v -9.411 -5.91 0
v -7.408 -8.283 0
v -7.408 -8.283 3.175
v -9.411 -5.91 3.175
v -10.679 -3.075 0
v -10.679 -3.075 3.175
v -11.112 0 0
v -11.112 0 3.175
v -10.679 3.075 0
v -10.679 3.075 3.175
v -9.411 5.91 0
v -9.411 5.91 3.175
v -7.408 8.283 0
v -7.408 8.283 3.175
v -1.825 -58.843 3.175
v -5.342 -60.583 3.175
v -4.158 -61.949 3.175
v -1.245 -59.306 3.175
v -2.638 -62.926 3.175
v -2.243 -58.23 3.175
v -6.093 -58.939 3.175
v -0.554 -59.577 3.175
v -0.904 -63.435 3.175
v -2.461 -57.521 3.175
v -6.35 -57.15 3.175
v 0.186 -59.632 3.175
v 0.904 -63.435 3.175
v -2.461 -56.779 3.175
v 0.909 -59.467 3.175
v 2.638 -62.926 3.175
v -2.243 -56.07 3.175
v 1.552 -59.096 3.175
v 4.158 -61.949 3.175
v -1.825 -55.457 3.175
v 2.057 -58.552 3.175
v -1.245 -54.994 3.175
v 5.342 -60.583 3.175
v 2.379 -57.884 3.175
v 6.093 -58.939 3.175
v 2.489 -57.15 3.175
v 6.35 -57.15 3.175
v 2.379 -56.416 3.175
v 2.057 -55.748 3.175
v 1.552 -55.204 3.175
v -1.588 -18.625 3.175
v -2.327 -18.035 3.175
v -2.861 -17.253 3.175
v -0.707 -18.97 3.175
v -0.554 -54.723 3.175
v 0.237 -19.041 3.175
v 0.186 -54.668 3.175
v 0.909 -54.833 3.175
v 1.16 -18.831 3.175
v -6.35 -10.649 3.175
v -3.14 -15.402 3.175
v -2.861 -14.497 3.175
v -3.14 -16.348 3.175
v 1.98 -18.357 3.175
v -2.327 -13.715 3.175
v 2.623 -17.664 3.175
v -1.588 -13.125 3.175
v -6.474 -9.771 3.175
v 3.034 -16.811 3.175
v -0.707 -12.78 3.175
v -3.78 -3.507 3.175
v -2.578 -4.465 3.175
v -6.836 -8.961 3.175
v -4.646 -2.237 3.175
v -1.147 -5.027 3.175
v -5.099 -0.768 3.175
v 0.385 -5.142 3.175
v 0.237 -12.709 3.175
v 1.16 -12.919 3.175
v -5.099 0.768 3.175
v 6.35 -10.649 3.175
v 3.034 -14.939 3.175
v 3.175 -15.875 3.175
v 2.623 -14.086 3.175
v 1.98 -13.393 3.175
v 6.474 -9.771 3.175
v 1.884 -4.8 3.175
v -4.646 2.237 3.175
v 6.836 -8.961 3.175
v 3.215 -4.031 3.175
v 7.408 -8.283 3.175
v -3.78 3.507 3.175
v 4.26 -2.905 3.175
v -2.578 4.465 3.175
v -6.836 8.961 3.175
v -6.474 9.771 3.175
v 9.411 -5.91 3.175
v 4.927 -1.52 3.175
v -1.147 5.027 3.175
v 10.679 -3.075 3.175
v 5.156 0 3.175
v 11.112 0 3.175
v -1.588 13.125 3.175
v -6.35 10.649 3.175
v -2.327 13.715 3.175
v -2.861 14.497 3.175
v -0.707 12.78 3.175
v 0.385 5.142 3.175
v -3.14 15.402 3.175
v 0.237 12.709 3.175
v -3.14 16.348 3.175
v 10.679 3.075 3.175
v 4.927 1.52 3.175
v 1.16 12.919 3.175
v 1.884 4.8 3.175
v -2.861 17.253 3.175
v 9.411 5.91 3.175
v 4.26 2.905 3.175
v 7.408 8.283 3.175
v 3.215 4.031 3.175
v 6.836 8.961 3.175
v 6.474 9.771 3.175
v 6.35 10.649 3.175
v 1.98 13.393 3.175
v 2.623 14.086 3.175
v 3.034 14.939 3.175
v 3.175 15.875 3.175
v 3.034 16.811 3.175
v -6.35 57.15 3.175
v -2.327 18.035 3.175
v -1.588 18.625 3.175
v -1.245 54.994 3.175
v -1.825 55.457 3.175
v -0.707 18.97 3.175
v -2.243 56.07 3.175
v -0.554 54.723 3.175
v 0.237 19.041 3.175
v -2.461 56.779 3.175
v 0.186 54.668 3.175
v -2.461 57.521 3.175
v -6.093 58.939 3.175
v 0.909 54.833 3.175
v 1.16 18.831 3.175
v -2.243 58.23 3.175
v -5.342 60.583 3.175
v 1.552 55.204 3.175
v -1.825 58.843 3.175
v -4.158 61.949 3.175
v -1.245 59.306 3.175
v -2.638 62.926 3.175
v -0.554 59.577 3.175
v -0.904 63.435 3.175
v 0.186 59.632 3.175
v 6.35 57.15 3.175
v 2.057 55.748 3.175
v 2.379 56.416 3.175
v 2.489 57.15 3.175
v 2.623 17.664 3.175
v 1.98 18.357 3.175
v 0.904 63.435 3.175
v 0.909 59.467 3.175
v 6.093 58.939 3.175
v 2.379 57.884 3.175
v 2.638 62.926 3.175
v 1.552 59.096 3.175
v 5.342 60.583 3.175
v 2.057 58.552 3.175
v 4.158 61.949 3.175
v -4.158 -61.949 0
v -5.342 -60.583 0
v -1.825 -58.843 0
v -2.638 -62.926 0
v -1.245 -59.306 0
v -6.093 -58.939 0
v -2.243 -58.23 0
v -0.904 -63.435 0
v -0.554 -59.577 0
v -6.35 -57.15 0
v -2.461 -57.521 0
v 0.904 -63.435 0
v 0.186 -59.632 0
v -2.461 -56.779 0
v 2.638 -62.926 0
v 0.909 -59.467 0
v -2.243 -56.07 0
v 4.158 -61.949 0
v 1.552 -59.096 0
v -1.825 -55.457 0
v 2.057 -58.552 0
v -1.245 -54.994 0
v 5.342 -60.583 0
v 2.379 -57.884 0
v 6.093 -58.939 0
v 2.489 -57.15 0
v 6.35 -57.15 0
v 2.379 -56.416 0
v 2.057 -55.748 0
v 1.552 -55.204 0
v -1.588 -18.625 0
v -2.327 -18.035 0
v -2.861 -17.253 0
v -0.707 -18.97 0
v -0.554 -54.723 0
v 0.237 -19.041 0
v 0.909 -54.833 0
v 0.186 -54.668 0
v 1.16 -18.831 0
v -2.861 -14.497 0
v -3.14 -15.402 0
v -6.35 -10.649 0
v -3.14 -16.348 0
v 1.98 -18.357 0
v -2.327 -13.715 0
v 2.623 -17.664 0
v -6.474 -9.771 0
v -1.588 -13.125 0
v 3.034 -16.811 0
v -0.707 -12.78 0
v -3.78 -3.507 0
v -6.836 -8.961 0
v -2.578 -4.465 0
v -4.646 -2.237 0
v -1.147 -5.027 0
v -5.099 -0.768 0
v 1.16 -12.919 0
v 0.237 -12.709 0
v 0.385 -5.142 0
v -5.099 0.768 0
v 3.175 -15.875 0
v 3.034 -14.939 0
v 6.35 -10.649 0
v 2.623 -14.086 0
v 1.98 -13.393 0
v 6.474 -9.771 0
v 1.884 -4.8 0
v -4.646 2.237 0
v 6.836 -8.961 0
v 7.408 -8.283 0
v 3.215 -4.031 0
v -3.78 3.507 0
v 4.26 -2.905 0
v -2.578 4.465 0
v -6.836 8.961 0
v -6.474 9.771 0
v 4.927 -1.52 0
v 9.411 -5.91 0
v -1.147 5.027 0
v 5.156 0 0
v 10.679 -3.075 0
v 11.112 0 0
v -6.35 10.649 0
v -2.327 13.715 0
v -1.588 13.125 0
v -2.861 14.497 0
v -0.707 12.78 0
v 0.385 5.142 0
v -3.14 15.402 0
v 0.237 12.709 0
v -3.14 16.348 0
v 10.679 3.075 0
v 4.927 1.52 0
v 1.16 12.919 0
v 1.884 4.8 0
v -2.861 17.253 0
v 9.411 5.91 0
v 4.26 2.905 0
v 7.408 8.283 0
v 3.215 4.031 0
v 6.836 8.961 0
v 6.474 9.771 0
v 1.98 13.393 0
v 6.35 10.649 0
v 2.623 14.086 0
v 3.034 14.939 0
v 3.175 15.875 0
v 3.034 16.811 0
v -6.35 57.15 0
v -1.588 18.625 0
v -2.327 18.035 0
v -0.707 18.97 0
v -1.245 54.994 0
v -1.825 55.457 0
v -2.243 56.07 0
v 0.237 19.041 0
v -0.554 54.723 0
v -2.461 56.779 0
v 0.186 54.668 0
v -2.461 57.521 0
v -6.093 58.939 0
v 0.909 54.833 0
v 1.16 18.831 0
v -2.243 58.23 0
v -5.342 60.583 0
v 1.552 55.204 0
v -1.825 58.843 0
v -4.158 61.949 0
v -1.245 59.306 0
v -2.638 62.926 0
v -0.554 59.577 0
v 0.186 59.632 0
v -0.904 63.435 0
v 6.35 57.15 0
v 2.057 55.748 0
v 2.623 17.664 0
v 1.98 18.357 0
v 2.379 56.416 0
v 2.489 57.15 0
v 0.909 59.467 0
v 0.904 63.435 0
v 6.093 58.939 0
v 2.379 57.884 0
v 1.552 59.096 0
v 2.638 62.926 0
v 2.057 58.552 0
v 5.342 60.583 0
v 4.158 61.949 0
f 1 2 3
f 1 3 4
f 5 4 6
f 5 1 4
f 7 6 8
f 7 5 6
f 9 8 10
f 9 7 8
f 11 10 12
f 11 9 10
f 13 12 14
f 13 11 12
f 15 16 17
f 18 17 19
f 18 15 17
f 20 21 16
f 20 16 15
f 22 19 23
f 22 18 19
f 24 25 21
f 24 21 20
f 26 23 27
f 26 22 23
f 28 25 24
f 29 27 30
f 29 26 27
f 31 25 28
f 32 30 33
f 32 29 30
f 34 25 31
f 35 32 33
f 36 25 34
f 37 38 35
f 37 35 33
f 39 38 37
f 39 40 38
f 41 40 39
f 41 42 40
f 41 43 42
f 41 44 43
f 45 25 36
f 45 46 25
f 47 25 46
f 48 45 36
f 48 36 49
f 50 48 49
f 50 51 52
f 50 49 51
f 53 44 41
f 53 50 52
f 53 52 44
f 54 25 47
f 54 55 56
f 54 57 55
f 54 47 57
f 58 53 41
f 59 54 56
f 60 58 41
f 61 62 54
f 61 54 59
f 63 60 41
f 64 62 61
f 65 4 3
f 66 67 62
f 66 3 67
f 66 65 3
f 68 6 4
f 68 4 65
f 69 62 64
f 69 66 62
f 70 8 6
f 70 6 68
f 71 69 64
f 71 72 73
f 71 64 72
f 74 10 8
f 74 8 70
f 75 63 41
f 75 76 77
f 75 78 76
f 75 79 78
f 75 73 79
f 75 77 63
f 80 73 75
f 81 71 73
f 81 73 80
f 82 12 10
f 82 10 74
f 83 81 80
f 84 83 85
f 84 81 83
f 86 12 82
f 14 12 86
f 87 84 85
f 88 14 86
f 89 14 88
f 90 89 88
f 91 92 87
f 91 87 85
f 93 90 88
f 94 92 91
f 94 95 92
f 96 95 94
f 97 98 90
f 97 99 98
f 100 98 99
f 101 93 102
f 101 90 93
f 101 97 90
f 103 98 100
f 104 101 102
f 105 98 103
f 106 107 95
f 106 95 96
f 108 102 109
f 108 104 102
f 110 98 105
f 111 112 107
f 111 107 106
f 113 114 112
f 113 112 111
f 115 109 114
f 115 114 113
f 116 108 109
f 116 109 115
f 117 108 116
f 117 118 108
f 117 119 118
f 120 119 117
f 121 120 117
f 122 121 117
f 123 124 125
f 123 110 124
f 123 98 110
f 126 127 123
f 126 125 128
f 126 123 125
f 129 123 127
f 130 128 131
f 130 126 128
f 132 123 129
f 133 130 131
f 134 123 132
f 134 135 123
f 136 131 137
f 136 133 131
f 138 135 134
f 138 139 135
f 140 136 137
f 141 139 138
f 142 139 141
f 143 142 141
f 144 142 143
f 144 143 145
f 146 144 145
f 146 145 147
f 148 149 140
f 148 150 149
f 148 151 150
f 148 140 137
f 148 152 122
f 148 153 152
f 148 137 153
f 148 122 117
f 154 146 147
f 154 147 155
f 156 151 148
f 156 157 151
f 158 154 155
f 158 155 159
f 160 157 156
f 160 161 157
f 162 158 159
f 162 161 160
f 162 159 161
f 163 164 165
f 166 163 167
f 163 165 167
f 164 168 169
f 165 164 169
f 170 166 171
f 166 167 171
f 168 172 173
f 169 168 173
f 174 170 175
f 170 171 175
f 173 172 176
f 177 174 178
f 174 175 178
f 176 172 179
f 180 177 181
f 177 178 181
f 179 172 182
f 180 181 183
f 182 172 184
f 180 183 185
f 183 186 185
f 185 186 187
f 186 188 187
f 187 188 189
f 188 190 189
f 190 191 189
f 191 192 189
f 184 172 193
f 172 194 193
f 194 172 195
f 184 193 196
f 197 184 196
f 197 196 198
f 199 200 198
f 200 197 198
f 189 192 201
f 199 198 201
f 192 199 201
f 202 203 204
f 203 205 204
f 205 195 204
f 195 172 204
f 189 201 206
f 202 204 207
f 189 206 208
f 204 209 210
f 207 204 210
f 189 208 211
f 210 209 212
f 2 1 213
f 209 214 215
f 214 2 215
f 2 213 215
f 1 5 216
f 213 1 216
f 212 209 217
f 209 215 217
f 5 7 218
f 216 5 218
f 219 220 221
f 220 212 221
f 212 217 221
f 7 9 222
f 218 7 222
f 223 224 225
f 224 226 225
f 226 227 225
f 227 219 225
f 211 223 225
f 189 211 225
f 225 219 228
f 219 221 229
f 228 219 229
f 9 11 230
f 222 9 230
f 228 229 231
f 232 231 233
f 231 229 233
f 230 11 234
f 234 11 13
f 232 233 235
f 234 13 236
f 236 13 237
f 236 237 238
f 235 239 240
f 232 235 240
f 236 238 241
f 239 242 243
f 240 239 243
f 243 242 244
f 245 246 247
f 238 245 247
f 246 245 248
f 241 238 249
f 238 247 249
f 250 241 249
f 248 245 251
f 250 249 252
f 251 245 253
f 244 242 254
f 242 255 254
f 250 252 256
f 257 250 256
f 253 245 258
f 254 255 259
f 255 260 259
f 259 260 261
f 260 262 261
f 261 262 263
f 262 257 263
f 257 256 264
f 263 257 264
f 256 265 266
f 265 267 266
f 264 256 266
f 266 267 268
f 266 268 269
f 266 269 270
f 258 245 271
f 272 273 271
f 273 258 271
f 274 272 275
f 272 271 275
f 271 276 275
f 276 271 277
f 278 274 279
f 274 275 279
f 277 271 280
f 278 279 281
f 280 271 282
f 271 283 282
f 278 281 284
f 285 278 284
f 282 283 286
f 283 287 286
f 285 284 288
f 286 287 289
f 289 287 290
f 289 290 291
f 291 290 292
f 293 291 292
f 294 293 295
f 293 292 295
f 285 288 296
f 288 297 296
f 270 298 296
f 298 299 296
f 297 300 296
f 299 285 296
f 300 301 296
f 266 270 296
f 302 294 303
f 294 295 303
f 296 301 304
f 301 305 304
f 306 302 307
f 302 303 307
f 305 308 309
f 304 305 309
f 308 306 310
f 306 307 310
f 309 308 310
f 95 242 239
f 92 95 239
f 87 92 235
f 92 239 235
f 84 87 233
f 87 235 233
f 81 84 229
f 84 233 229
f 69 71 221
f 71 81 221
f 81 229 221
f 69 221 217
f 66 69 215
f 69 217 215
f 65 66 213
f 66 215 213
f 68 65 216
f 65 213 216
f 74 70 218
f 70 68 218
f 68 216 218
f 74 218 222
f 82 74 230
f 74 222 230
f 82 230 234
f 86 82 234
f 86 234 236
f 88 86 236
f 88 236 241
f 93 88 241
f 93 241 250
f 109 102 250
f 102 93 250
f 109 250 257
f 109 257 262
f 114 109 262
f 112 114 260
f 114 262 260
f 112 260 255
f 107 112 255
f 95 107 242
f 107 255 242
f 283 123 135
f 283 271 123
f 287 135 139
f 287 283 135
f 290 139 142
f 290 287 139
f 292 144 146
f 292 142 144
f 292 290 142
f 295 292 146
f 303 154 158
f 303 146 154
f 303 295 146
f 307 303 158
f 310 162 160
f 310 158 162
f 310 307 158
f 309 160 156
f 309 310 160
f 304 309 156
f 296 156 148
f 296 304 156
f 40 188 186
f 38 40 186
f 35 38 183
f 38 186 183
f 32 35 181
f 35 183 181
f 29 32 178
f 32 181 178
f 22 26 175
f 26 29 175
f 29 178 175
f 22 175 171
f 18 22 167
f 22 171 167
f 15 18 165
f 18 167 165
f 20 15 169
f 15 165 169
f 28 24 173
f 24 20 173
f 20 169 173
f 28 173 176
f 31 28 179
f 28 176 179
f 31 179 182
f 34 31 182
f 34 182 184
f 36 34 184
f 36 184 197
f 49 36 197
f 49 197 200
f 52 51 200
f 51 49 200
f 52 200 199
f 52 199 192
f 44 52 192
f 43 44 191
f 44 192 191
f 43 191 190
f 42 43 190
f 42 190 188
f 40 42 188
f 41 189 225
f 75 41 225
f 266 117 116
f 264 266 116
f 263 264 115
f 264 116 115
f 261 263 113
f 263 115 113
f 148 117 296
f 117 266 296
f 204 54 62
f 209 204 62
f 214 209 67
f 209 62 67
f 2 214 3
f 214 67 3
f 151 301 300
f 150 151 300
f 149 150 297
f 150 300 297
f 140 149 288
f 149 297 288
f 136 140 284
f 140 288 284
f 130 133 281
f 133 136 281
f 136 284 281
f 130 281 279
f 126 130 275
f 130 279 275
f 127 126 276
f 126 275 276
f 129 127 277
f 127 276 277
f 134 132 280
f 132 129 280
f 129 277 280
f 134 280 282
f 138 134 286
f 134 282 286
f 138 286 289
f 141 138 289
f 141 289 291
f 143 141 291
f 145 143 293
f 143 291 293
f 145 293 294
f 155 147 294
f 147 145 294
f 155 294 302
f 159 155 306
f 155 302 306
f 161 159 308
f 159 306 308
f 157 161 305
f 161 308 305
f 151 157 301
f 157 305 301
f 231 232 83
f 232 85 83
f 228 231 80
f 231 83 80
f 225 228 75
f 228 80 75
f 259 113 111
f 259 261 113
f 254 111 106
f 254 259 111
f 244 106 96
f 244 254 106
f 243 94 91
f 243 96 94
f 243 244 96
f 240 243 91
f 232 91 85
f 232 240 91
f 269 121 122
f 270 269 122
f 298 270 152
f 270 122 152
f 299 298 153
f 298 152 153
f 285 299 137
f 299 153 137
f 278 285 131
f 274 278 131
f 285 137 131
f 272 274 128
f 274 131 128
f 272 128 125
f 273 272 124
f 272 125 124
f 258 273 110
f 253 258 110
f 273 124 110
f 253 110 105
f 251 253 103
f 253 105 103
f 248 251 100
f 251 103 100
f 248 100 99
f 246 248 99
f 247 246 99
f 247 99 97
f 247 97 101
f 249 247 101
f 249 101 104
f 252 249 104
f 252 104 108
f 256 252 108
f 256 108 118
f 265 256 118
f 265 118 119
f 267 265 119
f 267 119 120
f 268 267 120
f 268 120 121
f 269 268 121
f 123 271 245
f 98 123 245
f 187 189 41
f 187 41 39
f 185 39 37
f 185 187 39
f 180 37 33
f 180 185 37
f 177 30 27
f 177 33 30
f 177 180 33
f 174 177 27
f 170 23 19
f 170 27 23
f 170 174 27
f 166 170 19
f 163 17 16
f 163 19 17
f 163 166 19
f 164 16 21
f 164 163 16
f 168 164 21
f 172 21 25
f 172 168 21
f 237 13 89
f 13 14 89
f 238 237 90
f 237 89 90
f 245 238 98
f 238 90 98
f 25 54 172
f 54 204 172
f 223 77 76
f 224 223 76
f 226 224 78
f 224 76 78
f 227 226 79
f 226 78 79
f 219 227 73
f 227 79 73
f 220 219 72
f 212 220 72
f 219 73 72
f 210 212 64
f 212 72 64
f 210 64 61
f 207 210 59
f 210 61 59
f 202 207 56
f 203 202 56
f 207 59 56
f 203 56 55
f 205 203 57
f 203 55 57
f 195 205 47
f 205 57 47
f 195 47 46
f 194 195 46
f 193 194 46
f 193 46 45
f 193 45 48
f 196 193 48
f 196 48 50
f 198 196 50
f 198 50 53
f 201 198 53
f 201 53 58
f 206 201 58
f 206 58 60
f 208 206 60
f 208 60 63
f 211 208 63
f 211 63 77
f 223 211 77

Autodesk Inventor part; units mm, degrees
ref_plane "YZ Plane" through (0, 0, 0) normal (1, 0, 0) x (0, 1, 0)
ref_plane "XZ Plane" through (0, 0, 0) normal (0, 1, 0) x (-1, 0, 0)
ref_plane "XY Plane" through (0, 0, 0) normal (0, 0, 1) x (1, 0, 0)
sketch "Sketch1" plane through (0, 0, 0) normal (0, 0, 1) x (1, 0, 0)
  line L0 (0, -57.15) -> (0, 57.15) construction
  line L1 (6.35, -57.15) -> (6.35, 57.15)
  line L2 (-6.35, 57.15) -> (-6.35, -57.15)
  arc A0 (-6.35, -57.15) -> (6.35, -57.15) centre (0, -57.15) ccw
  arc A1 (6.35, 57.15) -> (-6.35, 57.15) centre (0, 57.15) ccw
  circle A2 centre (0, 57.15) radius 2.4892
  circle A3 centre (0, -57.15) radius 2.4892
  circle A4 centre (0, 0) radius 5.1562
  circle A5 centre (0, 0) radius 11.1125
  point P0 (-6.35, 9.1195)
  point P1 (-6.35, -9.1195)
  point P2 (6.35, -9.1195)
  point P3 (6.35, 9.1195)
  dimension "d0" = 114.3
  dimension "d1" = 12.7
  dimension "d2" = 4.9784
  dimension "d3" = 10.3124
  dimension "d4" = 22.225
extrude "Extrusion1" add sketch "Sketch1" along normal blind 3.175
sketch "Sketch2" plane through (0, 0, 3.175) normal (0, 0, 1) x (1, 0, 0)
  circle A0 centre (0, 0) radius 15.875 construction
  circle A1 centre (0, 15.875) radius 3.175
  circle A2 centre (0, -15.875) radius 3.175
  dimension "d7" = 31.75
  dimension "d8" = 6.35
  dimension "d9" = 6.35
extrude "Extrusion2" cut sketch "Sketch2" against normal through all
fillet "Fillet1" radius 3.175 4 edges at (6.35, 9.1195, 1.5875) (6.35, -9.1195, 1.5875) (-6.35, -9.1195, 1.5875) (-6.35, 9.1195, 1.5875)
properties part number "EncoderStrip" material "Aluminum 6061"
